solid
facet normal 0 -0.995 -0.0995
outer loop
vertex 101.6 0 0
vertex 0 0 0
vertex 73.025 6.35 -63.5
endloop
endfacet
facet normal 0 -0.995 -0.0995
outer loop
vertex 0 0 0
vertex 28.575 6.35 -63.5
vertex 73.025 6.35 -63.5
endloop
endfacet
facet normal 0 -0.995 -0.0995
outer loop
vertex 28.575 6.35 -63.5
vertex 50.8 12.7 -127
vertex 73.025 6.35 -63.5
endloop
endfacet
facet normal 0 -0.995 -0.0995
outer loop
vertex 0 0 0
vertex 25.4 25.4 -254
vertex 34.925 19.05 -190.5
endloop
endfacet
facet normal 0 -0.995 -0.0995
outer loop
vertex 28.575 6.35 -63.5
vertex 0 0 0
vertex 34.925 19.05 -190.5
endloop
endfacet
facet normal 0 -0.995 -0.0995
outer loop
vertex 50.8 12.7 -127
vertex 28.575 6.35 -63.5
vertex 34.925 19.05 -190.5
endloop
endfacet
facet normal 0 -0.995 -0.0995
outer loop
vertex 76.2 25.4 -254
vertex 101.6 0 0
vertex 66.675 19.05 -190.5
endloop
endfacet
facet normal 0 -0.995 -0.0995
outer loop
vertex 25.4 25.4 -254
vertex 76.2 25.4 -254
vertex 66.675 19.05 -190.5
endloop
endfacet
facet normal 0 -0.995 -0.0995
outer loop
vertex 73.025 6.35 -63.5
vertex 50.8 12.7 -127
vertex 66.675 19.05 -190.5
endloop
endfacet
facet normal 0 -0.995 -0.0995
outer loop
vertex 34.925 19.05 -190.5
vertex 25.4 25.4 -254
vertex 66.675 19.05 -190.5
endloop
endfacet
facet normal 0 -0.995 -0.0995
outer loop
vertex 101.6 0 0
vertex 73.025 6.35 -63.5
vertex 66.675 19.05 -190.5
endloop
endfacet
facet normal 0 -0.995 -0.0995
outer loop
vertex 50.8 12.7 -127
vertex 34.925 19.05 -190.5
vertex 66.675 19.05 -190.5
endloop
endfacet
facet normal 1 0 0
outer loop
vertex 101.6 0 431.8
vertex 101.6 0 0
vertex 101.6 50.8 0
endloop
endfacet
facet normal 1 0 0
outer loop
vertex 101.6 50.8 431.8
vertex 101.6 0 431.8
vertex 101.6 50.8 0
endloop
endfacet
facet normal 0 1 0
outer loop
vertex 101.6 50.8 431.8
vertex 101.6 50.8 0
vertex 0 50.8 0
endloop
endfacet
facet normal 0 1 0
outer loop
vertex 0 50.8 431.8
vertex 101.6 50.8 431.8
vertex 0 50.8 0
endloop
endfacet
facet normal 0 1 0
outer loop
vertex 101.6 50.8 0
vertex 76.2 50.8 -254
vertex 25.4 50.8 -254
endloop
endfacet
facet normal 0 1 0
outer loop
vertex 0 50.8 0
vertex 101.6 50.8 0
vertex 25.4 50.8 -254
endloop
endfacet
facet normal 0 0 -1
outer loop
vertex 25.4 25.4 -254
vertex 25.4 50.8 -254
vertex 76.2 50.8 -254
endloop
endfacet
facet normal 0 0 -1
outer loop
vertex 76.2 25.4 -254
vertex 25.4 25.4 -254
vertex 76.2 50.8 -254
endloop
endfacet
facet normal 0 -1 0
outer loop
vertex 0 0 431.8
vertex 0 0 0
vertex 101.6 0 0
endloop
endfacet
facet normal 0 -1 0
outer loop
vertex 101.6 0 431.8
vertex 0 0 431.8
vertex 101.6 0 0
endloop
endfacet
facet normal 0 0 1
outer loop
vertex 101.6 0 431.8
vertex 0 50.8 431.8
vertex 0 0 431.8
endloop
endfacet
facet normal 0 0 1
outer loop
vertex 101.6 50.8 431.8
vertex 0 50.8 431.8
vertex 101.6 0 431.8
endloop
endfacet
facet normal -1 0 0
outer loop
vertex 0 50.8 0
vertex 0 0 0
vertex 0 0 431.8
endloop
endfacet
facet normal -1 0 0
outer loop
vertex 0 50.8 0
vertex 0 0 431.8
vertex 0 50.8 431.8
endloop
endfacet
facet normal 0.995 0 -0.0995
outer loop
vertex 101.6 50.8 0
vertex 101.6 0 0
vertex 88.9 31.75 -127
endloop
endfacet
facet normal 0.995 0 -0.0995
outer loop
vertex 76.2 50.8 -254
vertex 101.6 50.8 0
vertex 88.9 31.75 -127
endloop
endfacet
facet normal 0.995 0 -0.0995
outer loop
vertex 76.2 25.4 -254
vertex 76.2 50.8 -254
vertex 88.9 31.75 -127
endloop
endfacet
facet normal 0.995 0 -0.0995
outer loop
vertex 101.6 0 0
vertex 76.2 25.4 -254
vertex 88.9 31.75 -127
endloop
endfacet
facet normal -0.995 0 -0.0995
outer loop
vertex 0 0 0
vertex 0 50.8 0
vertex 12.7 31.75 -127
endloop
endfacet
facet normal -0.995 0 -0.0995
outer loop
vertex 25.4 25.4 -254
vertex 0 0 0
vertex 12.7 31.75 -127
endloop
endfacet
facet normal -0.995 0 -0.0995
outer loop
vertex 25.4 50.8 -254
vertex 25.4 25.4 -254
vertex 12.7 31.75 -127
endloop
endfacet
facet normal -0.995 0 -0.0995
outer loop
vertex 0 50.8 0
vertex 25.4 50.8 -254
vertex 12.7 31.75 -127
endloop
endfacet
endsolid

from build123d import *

# Parameters (mm, degrees)
SKETCH1_W           = 101.6
SKETCH1_H           = 50.8
BOSS_EXTRUDE1_DEPTH = 431.8
SKETCH2_W           = 101.6
SKETCH2_H           = 50.8
SKETCH3_W           = 50.8
SKETCH3_H           = 25.4


with BuildPart() as part:
    # Sketch1 → Boss-Extrude1 (new body)
    with BuildSketch(Plane.XY):
        with Locations((50.8, 25.4)):
            Rectangle(SKETCH1_W, SKETCH1_H)
    extrude(amount=BOSS_EXTRUDE1_DEPTH)

    # Sketch2 → Loft1 section 0
    with BuildSketch(Plane.XY):
        with Locations((50.8, 25.4)):
            Rectangle(SKETCH2_W, SKETCH2_H)
    # Sketch3 → Loft1 section 1
    with BuildSketch(Plane(origin=(0, 0, -254), x_dir=(-1, 0, 0), z_dir=(0, 0, -1))):
        with Locations((-50.8, 38.1)):
            Rectangle(SKETCH3_W, SKETCH3_H)
    loft()


solid = part.part
